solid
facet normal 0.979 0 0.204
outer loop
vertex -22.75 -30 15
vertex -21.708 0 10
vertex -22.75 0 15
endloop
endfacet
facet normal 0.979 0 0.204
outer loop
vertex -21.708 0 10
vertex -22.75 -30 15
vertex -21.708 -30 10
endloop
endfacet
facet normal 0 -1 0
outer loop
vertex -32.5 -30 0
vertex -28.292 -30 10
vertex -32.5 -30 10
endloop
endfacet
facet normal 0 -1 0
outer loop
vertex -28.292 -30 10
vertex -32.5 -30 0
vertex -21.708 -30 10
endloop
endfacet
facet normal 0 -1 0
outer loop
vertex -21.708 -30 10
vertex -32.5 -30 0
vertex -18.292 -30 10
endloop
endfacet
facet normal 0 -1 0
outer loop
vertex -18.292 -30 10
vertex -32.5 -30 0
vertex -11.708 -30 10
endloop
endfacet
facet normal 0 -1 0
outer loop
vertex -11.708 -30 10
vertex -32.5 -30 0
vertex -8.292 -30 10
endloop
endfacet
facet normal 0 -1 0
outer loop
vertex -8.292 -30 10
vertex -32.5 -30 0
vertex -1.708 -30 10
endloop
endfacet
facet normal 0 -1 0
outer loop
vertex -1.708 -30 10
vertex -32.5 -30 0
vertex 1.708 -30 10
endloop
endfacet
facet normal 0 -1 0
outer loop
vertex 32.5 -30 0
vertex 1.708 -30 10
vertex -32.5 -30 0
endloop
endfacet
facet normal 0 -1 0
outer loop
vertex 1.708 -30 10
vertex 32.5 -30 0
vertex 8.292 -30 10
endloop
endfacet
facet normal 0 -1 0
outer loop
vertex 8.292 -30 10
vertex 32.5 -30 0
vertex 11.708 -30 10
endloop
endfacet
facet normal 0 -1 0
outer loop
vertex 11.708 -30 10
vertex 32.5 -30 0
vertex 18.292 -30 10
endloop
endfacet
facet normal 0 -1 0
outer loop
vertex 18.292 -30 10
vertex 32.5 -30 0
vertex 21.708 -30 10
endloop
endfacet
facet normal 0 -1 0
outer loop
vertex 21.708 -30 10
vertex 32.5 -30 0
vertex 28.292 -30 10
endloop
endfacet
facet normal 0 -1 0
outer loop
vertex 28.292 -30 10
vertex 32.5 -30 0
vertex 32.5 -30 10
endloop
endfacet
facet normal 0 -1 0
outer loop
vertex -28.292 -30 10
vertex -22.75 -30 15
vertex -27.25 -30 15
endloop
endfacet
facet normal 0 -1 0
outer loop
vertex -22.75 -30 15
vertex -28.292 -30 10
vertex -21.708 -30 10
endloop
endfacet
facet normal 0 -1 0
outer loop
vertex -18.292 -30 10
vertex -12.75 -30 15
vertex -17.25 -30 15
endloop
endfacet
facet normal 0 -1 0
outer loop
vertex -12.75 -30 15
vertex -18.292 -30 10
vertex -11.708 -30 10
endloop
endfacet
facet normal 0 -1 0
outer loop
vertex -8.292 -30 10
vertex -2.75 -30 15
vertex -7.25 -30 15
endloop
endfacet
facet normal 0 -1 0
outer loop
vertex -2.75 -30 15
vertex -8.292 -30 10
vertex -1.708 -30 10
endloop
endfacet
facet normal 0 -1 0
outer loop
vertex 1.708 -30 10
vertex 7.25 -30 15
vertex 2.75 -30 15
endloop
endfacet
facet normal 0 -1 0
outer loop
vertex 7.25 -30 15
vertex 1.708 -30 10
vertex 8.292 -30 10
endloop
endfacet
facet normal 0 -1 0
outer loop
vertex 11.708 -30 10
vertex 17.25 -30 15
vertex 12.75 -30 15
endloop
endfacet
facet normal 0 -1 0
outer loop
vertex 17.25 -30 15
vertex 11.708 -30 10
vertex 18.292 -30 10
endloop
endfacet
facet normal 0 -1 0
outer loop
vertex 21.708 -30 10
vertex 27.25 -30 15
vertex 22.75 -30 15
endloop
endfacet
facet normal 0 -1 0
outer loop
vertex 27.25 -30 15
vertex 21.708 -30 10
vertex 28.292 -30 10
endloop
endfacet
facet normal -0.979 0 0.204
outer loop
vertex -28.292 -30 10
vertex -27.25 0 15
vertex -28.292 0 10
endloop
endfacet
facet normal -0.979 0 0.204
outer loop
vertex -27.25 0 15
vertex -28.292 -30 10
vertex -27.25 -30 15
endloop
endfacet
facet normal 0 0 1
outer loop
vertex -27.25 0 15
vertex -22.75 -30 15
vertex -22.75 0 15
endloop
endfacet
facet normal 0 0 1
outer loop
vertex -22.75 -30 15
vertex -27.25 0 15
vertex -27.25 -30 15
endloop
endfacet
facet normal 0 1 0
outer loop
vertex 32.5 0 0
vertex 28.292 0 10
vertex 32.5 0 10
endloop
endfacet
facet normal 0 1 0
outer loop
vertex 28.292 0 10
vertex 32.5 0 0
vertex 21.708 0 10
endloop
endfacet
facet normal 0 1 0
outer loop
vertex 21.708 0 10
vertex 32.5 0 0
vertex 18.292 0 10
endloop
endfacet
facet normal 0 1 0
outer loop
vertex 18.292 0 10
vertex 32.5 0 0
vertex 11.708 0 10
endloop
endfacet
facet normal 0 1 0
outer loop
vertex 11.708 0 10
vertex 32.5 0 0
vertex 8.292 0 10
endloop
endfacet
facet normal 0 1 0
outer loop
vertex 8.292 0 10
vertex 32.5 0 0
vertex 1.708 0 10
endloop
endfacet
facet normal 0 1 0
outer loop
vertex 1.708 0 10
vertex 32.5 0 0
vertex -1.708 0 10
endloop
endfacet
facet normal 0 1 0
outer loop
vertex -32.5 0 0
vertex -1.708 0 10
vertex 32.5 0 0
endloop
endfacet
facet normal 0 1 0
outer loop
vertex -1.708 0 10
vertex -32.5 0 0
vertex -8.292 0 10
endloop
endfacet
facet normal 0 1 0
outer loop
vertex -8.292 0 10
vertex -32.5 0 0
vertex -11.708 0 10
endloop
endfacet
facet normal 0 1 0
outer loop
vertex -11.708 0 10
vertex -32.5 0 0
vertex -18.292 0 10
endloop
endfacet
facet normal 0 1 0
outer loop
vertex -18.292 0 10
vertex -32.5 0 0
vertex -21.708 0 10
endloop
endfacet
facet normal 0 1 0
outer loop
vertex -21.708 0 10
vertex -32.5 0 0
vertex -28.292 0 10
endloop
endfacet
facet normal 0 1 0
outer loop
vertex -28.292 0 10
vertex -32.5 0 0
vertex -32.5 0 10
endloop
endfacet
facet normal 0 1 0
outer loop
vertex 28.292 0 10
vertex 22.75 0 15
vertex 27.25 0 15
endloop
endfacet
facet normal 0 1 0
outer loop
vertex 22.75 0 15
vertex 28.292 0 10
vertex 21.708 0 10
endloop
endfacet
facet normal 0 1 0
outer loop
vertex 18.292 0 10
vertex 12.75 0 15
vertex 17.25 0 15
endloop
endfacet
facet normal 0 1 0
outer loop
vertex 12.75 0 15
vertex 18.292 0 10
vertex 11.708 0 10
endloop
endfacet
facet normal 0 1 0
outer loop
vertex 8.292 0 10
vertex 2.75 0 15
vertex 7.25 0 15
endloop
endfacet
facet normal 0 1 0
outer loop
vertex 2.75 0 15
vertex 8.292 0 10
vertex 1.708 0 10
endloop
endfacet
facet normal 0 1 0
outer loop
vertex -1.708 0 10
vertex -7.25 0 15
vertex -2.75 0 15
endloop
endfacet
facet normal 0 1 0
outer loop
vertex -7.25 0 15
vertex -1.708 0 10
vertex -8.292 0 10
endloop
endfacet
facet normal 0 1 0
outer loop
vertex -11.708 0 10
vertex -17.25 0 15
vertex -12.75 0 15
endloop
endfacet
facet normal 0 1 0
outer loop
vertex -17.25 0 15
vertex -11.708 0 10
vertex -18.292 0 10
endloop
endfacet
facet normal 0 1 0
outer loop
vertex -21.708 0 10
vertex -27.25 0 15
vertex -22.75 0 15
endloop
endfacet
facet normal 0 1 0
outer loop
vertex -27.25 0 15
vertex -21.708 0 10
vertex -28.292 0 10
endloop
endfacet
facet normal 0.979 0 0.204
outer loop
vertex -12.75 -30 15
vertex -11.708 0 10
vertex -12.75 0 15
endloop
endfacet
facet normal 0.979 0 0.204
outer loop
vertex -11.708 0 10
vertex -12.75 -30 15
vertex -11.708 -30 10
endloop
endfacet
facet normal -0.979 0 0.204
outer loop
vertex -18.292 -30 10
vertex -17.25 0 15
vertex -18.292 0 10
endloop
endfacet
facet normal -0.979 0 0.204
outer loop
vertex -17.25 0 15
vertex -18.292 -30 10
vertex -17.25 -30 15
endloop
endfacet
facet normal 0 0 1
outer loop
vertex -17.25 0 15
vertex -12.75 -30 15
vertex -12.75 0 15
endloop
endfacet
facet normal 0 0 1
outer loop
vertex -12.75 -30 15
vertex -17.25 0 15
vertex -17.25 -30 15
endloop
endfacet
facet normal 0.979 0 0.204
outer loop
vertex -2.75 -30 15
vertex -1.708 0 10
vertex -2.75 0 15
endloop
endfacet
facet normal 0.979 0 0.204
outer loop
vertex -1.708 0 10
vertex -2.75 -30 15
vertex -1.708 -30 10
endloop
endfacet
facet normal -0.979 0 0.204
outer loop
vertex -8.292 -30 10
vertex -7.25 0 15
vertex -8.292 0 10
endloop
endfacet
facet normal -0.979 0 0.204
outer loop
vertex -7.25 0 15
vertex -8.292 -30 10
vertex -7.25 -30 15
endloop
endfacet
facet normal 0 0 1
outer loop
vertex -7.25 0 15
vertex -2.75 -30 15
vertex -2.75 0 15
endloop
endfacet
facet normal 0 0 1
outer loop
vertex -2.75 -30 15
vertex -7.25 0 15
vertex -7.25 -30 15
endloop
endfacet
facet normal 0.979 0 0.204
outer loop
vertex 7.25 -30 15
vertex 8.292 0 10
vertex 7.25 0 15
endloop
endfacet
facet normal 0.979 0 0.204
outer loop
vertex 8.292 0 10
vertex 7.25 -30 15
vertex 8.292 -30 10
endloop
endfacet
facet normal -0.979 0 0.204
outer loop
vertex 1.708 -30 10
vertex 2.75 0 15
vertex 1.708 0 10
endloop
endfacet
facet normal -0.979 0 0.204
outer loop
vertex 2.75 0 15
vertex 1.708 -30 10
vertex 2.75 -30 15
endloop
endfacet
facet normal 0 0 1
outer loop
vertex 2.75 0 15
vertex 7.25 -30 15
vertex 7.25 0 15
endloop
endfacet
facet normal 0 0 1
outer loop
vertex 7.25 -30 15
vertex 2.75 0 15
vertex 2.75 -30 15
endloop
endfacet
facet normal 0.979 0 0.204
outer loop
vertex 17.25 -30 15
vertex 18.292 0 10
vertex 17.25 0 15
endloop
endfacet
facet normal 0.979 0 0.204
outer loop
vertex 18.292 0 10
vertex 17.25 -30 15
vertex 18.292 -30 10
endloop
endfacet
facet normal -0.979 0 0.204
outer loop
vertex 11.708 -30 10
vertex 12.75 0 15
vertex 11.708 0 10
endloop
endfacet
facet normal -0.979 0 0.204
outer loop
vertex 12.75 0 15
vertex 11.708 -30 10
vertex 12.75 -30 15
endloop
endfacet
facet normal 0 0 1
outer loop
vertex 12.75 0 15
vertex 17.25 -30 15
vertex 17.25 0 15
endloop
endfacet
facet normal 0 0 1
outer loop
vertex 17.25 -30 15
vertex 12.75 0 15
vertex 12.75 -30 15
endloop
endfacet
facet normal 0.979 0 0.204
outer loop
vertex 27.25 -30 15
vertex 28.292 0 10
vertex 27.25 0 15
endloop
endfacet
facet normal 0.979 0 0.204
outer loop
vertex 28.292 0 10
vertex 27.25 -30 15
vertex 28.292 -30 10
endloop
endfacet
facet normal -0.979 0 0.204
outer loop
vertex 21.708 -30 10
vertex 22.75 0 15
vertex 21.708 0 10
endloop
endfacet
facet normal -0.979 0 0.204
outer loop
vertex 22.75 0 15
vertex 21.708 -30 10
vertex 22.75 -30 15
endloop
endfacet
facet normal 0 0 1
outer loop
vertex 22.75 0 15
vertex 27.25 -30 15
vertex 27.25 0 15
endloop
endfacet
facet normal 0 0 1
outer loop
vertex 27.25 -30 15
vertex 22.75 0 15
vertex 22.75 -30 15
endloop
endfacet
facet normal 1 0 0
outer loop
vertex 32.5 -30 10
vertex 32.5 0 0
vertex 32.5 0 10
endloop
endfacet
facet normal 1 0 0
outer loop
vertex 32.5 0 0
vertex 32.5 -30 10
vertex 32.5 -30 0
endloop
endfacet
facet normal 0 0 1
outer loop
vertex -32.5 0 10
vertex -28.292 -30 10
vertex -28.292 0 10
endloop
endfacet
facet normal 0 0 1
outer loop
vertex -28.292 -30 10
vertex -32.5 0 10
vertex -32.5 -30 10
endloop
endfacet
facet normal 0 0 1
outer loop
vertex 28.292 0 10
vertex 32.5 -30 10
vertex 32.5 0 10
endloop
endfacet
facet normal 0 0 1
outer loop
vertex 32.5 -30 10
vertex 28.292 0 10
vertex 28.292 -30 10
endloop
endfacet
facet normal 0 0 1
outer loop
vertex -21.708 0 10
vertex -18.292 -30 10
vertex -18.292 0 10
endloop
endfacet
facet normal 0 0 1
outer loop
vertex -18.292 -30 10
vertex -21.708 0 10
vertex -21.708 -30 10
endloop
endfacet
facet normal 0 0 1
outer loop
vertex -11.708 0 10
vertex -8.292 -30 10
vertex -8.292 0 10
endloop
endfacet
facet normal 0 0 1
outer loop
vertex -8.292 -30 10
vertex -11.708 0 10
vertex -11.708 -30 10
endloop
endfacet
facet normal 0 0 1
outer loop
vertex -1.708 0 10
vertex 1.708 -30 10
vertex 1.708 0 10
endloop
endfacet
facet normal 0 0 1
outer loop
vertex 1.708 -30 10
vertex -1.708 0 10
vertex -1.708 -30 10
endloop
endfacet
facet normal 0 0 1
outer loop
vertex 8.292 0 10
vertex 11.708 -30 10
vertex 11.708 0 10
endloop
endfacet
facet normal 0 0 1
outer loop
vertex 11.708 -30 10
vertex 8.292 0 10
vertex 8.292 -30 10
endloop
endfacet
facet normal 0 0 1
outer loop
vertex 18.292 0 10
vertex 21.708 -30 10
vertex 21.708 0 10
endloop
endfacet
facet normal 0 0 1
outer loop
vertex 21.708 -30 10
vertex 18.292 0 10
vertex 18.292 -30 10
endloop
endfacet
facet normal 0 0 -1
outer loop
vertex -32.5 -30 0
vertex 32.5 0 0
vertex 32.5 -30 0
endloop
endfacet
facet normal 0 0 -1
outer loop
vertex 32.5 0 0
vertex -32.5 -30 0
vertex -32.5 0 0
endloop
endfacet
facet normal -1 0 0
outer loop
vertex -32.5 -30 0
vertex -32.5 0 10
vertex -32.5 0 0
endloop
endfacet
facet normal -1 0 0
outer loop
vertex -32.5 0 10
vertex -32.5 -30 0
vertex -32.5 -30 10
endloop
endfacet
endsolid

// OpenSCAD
$fn = 32;

// ----------------------------------------------------------------------
// Toothed rack, 6 teeth
// 10 mm pitch, 5 mm teeth
// ----------------------------------------------------------------------

// --- parameters (mm) ---
bar_w = 30;     // bar width (Y)
bar_h = 10;     // bar height (Z)
teeth = 6;      // number of teeth
pitch = 10;     // tooth pitch
tooth_h = 5;    // tooth height above the bar
root_w = 7;     // tooth width at the root
crest_w = 4.5;  // tooth width at the crest

// --- derived feature positions (mm) ---
span = (teeth - 1) * pitch;  // = 50   distance between the outer teeth
bar_l = span + root_w + 8;   // = 65   bar length: teeth plus 4 mm at each end
tooth_x = -span / 2;         // = -25   X of the first tooth
height = bar_h + tooth_h;    // = 15   overall height
feature_centers = [
  [tooth_x + 0 * pitch, -bar_w / 2],
  [tooth_x + 1 * pitch, -bar_w / 2],
  [tooth_x + 2 * pitch, -bar_w / 2],
  [tooth_x + 3 * pitch, -bar_w / 2],
  [tooth_x + 4 * pitch, -bar_w / 2],
  [tooth_x + 5 * pitch, -bar_w / 2]
];   // tooth centre line, drives the tooth loop

// bar with a rack of teeth, one extruded trapezoium per centre
module rack_tooth() {
  linear_extrude(height = bar_w)
    polygon(points = [
      [0, 0],
      [root_w, 0],
      [root_w / 2 + crest_w / 2, tooth_h + 1],
      [root_w / 2 - crest_w / 2, tooth_h + 1]
    ]);
}

union() {
  translate([-bar_l / 2, -bar_w, 0]) cube([bar_l, bar_w, bar_h]);
  for (centre = feature_centers)
    translate([centre[0] - root_w / 2, 0, bar_h - 1]) rotate([90, 0, 0]) rack_tooth();
}
